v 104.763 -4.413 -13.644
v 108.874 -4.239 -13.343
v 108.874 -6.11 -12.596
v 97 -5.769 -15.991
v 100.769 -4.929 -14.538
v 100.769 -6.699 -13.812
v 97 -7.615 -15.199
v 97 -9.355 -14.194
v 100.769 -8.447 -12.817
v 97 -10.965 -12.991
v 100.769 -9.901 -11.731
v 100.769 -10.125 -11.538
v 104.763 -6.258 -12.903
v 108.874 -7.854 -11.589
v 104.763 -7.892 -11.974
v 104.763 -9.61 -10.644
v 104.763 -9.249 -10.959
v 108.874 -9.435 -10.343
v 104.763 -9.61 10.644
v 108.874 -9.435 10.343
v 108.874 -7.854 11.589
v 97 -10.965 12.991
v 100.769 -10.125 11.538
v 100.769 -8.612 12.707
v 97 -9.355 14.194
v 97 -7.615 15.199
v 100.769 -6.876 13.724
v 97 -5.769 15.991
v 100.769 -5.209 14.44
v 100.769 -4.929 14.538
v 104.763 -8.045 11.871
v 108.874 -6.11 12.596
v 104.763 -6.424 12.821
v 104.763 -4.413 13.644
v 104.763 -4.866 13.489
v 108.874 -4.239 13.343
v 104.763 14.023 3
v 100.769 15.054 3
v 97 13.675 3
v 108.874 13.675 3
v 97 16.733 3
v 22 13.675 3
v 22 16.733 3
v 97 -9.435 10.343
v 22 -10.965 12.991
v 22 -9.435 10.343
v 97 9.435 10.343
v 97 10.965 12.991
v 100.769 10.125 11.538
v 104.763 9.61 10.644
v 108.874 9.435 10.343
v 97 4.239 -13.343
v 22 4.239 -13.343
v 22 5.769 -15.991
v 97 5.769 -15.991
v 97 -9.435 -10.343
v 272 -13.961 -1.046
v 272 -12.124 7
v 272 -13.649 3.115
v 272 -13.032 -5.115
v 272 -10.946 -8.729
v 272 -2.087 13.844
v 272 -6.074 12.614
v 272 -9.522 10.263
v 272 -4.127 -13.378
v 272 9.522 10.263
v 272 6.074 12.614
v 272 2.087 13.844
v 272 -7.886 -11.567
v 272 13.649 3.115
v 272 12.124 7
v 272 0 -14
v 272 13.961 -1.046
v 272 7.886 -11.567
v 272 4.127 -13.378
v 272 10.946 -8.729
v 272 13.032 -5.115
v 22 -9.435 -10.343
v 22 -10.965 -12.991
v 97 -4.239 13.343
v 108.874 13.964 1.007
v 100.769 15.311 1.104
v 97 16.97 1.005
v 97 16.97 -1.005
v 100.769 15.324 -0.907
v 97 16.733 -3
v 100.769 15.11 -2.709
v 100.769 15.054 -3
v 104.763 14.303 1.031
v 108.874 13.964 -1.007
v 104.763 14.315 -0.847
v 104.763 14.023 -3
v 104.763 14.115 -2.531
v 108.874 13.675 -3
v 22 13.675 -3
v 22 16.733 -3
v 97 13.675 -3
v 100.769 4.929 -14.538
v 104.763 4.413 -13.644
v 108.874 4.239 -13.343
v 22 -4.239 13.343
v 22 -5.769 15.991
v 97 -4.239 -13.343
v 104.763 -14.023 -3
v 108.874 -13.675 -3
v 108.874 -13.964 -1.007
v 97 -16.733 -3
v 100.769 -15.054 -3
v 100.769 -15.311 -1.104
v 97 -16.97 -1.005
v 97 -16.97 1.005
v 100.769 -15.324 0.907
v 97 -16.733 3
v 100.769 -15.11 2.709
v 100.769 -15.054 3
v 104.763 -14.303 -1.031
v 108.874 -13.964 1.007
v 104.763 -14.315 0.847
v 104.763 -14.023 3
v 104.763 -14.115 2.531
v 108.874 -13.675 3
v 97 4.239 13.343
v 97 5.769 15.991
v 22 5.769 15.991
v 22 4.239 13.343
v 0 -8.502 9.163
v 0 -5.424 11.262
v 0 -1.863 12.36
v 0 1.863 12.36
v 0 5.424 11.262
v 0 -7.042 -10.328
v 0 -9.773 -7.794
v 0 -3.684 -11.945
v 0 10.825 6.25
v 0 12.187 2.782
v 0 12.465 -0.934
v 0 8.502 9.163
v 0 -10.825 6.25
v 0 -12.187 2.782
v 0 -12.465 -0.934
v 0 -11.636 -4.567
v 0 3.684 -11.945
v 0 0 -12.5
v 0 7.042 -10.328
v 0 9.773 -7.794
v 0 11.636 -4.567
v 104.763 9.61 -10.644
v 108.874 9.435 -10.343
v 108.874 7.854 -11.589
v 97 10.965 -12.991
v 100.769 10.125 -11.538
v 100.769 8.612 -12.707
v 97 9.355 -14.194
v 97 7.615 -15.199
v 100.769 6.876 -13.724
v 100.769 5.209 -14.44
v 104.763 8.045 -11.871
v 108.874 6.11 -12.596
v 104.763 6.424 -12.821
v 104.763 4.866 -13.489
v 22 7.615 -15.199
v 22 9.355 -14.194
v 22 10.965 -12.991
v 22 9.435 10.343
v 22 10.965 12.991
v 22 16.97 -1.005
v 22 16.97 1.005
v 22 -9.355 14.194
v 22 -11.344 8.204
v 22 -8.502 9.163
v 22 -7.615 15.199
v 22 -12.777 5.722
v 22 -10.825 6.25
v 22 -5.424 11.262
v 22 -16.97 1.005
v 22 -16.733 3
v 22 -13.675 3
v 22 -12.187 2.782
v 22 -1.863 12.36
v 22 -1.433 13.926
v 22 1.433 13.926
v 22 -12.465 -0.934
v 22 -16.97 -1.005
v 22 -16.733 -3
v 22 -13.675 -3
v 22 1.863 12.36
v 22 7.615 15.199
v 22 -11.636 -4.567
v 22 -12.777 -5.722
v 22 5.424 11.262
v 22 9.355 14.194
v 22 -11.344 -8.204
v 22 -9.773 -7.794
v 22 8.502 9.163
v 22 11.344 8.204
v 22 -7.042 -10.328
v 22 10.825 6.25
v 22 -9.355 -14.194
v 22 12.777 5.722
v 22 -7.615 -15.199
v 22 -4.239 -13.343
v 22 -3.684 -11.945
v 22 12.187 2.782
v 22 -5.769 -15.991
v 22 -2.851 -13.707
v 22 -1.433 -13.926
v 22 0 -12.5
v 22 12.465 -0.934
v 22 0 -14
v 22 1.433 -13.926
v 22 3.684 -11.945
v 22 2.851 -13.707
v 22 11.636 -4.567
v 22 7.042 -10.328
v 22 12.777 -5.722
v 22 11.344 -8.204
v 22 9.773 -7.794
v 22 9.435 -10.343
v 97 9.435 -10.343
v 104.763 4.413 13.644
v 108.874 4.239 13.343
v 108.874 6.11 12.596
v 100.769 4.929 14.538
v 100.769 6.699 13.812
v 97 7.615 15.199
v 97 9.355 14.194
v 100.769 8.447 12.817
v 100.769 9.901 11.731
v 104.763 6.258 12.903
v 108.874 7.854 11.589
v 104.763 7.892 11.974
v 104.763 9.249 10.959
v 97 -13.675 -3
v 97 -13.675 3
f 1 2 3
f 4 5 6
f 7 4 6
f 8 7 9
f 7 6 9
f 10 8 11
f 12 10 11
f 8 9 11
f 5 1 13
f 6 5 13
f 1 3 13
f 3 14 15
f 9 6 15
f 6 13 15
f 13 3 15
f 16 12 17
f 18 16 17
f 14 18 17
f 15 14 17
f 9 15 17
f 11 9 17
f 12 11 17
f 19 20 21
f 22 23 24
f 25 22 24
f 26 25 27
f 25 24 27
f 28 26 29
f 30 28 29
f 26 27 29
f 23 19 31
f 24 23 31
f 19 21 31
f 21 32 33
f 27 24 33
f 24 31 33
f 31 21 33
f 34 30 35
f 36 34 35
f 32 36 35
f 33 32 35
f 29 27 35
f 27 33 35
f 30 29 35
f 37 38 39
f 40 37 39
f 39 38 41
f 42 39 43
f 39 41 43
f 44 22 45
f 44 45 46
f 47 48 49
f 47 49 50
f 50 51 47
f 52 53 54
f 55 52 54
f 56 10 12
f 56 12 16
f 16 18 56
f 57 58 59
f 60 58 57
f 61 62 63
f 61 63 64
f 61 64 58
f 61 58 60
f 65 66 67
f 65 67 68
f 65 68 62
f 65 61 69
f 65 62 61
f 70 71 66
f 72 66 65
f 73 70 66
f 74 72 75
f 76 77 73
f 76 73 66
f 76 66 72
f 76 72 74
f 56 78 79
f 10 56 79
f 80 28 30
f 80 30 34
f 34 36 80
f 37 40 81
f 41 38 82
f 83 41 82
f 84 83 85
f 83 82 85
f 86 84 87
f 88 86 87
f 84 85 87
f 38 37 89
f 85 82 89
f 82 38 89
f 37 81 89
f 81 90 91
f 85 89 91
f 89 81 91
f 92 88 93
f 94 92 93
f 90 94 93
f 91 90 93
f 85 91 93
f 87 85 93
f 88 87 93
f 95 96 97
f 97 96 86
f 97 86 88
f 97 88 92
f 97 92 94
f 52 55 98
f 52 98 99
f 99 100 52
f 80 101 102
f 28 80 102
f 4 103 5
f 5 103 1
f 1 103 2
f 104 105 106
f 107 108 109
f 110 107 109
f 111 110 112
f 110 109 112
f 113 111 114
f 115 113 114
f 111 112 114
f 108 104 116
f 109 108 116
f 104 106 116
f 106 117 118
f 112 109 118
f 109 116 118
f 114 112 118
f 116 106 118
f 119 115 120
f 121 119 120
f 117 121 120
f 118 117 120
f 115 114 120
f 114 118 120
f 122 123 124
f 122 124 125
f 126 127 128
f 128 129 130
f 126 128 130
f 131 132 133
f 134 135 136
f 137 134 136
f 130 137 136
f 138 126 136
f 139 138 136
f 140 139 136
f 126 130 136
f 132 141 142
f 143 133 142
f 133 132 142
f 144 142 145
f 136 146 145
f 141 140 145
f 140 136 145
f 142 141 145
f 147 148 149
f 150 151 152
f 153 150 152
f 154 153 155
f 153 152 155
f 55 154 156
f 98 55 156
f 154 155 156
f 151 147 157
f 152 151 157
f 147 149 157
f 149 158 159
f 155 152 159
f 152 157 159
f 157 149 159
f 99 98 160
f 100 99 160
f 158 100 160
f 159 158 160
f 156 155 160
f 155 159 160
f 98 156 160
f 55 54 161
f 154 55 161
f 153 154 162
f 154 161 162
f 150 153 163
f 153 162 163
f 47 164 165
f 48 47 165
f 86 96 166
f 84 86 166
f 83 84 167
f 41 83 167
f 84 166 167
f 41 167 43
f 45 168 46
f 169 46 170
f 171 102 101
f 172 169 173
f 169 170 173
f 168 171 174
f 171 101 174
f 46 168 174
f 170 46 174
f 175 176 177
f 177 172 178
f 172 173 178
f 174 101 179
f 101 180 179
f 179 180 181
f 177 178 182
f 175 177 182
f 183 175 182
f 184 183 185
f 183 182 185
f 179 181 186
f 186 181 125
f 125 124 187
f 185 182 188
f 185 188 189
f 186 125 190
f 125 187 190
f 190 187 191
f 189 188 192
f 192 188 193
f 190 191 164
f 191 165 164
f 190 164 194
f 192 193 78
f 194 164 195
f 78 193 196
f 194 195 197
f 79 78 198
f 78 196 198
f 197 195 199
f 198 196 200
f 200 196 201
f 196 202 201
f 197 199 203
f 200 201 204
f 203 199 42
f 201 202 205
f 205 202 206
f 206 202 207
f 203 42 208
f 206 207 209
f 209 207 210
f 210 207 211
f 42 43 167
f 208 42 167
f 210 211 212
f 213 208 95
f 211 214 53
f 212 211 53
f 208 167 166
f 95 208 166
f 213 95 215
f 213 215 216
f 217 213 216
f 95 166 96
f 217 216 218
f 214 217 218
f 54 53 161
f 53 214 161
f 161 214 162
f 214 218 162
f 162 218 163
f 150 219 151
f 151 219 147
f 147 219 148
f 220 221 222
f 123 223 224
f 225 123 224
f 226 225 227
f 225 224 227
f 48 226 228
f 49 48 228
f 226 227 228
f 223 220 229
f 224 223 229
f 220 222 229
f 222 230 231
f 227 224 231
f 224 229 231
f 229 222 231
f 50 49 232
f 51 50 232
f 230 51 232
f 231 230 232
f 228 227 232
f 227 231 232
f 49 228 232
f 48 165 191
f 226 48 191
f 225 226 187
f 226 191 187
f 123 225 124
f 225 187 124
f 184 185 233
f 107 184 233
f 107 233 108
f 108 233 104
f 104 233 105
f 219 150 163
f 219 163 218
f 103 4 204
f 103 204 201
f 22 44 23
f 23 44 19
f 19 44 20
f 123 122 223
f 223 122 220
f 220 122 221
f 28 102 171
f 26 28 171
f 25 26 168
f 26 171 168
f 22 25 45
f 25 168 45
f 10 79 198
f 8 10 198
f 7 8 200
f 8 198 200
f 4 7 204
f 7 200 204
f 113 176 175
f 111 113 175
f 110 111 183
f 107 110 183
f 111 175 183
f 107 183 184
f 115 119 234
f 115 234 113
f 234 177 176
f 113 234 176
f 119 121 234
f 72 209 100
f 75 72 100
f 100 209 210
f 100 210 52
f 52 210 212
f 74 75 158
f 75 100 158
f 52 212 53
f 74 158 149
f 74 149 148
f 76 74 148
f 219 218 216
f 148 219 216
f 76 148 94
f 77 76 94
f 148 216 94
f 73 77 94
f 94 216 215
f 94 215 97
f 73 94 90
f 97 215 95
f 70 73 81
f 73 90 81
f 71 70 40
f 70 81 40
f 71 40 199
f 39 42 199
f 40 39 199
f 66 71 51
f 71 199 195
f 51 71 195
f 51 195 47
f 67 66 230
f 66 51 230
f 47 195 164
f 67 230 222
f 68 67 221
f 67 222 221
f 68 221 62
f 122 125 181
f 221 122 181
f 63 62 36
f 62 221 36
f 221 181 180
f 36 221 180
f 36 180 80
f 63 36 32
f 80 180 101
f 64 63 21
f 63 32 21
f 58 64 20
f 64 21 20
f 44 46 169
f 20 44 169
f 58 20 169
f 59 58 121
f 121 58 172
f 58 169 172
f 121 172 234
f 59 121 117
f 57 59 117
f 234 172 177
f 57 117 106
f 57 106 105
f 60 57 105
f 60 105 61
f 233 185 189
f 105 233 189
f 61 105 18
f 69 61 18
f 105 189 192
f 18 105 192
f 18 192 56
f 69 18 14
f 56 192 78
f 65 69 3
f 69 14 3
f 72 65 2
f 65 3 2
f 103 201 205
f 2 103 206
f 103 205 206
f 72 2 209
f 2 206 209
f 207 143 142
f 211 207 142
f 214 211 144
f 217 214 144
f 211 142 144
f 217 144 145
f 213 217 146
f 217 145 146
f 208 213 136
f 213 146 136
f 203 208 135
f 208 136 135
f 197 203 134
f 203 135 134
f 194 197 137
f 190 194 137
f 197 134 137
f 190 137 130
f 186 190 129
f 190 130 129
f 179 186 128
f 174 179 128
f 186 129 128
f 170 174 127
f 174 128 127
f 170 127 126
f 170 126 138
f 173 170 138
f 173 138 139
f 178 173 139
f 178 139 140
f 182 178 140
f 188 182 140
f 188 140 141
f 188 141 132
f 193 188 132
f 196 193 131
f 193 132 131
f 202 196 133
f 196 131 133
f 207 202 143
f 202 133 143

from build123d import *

# Parameters (mm, degrees)
SKETCH1_R           = 12.5
BOSS_EXTRUDE1_DEPTH = 22
SKETCH3_R           = 14
BOSS_EXTRUDE2_DEPTH = 250
BOSS_EXTRUDE3_DEPTH = 75
FILLET3_R           = 25


with BuildPart() as part:
    # Sketch1 → Boss-Extrude1 (new body)
    with BuildSketch(Plane(origin=(0, 0, 0), x_dir=(0, 0, -1), z_dir=(1, 0, 0))):
        Circle(SKETCH1_R)
    extrude(amount=BOSS_EXTRUDE1_DEPTH)

    # Sketch3 → Boss-Extrude2 (add)
    with BuildSketch(Plane(origin=(22, 0, 0), x_dir=(0, 0, -1), z_dir=(1, 0, 0))):
        Circle(SKETCH3_R)
    extrude(amount=BOSS_EXTRUDE2_DEPTH)

    # Sketch2 → Boss-Extrude3 (add)
    with BuildSketch(Plane(origin=(22, 0, 0), x_dir=(0, 0, -1), z_dir=(1, 0, 0))):
        with BuildLine():
            Line((-13.342719282, -4.239320954), (-15.991376746, -5.768524054))
            ThreePointArc((-15.991376746, -5.768524054), (-14.722431864, -8.5), (-12.991376746, -10.964676477))
            Line((-12.991376746, -10.964676477), (-10.342719282, -9.435473377))
            ThreePointArc((-10.342719282, -9.435473377), (-7, -12.124355653), (-3, -13.674794331))
            Line((-3, -13.674794331), (-3, -16.733200531))
            ThreePointArc((-3, -16.733200531), (0, -17), (3, -16.733200531))
            Line((3, -16.733200531), (3, -13.674794331))
            ThreePointArc((3, -13.674794331), (7, -12.124355653), (10.342719282, -9.435473377))
            Line((10.342719282, -9.435473377), (12.991376746, -10.964676477))
            ThreePointArc((12.991376746, -10.964676477), (14.722431864, -8.5), (15.991376746, -5.768524054))
            Line((15.991376746, -5.768524054), (13.342719282, -4.239320954))
            ThreePointArc((13.342719282, -4.239320954), (14, 0), (13.342719282, 4.239320954))
            Line((13.342719282, 4.239320954), (15.991376746, 5.768524054))
            ThreePointArc((15.991376746, 5.768524054), (14.722431864, 8.5), (12.991376746, 10.964676477))
            Line((12.991376746, 10.964676477), (10.342719282, 9.435473377))
            ThreePointArc((10.342719282, 9.435473377), (7, 12.124355653), (3, 13.674794331))
            Line((3, 13.674794331), (3, 16.733200531))
            ThreePointArc((3, 16.733200531), (0, 17), (-3, 16.733200531))
            Line((-3, 16.733200531), (-3, 13.674794331))
            ThreePointArc((-3, 13.674794331), (-7, 12.124355653), (-10.342719282, 9.435473377))
            Line((-10.342719282, 9.435473377), (-12.991376746, 10.964676477))
            ThreePointArc((-12.991376746, 10.964676477), (-14.722431864, 8.5), (-15.991376746, 5.768524054))
            Line((-15.991376746, 5.768524054), (-13.342719282, 4.239320954))
            ThreePointArc((-13.342719282, 4.239320954), (-14, 0), (-13.342719282, -4.239320954))
        make_face()
    extrude(amount=BOSS_EXTRUDE3_DEPTH)

    # Fillet3
    # the kernel refuses this fillet: 25 mm, written as the material it adds along each edge
    with BuildSketch(Plane(origin=(97, 0, 0), x_dir=(0, 0.27784568580579977, 0.960625720496336), z_dir=(0, -0.960625720496336, 0.27784568580579977))) as fillet3_piece_1_section:
        with BuildLine():
            CenterArc((39, -11.874342087), FILLET3_R, 151.642363424, 28.357636576)
            Line((17, 0), (14, 0))
            Line((14, 0), (14, -11.874342087))
        make_face()
    fillet3_piece_1 = revolve(axis=Axis((97, 0, 0), (-1, 0, 0)), revolution_arc=267.736659013, mode=Mode.PRIVATE)
    fillet3_piece_1 = split(fillet3_piece_1, bisect_by=Plane(origin=(97, 2.598076211, -1.5), z_dir=(0, -0.8660254037844357, 0.5000000000000051)), keep=Keep.TOP, mode=Mode.PRIVATE)
    fillet3_piece_1 = split(fillet3_piece_1, bisect_by=Plane(origin=(97, -2.598076211, 1.5), z_dir=(0, 0.8660254037844359, -0.5000000000000047)), keep=Keep.TOP, mode=Mode.PRIVATE)
    add(fillet3_piece_1)
    with BuildSketch(Plane(origin=(97, 0, 0), x_dir=(0, 0.27784568580579977, 0.960625720496336), z_dir=(0, -0.960625720496336, 0.27784568580579977))) as fillet3_piece_2_section:
        with BuildLine():
            CenterArc((39, -11.874342087), FILLET3_R, 151.642363424, 28.357636576)
            Line((17, 0), (14, 0))
            Line((14, 0), (14, -11.874342087))
        make_face()
    fillet3_piece_2 = revolve(axis=Axis((97, 0, 0), (-1, 0, 0)), revolution_arc=267.736659013, mode=Mode.PRIVATE)
    fillet3_piece_2 = split(fillet3_piece_2, bisect_by=Plane(origin=(97, 0, -3), z_dir=(0, 0, 1)), keep=Keep.TOP, mode=Mode.PRIVATE)
    fillet3_piece_2 = split(fillet3_piece_2, bisect_by=Plane(origin=(97, 0, 3), z_dir=(0, 0, -1)), keep=Keep.TOP, mode=Mode.PRIVATE)
    add(fillet3_piece_2)
    with BuildSketch(Plane(origin=(97, 0, 0), x_dir=(0, 0.27784568580579977, 0.960625720496336), z_dir=(0, -0.960625720496336, 0.27784568580579977))) as fillet3_piece_3_section:
        with BuildLine():
            CenterArc((39, -11.874342087), FILLET3_R, 151.642363424, 28.357636576)
            Line((17, 0), (14, 0))
            Line((14, 0), (14, -11.874342087))
        make_face()
    fillet3_piece_3 = revolve(axis=Axis((97, 0, 0), (-1, 0, 0)), revolution_arc=267.736659013, mode=Mode.PRIVATE)
    fillet3_piece_3 = split(fillet3_piece_3, bisect_by=Plane(origin=(97, -2.598076211, -1.5), z_dir=(0, 0.8660254037844438, 0.4999999999999911)), keep=Keep.TOP, mode=Mode.PRIVATE)
    fillet3_piece_3 = split(fillet3_piece_3, bisect_by=Plane(origin=(97, 2.598076211, 1.5), z_dir=(0, -0.8660254037844435, -0.49999999999999156)), keep=Keep.TOP, mode=Mode.PRIVATE)
    add(fillet3_piece_3)
    with BuildSketch(Plane(origin=(97, 0, 0), x_dir=(0, 0.9708491203814568, 0.23969143800843562), z_dir=(0, -0.23969143800843562, 0.9708491203814568))) as fillet3_piece_4_section:
        with BuildLine():
            CenterArc((39, -11.874342087), FILLET3_R, 151.642363424, 28.357636576)
            Line((17, 0), (14, 0))
            Line((14, 0), (14, -11.874342087))
        make_face()
    fillet3_piece_4 = revolve(axis=Axis((97, 0, 0), (-1, 0, 0)), revolution_arc=267.736659013, mode=Mode.PRIVATE)
    fillet3_piece_4 = split(fillet3_piece_4, bisect_by=Plane(origin=(97, 0, -3), z_dir=(0, 0, 1)), keep=Keep.TOP, mode=Mode.PRIVATE)
    fillet3_piece_4 = split(fillet3_piece_4, bisect_by=Plane(origin=(97, 0, 3), z_dir=(0, 0, -1)), keep=Keep.TOP, mode=Mode.PRIVATE)
    add(fillet3_piece_4)
    with BuildSketch(Plane(origin=(97, 0, 0), x_dir=(0, 0.9708491203814568, 0.23969143800843562), z_dir=(0, -0.23969143800843562, 0.9708491203814568))) as fillet3_piece_5_section:
        with BuildLine():
            CenterArc((39, -11.874342087), FILLET3_R, 151.642363424, 28.357636576)
            Line((17, 0), (14, 0))
            Line((14, 0), (14, -11.874342087))
        make_face()
    fillet3_piece_5 = revolve(axis=Axis((97, 0, 0), (-1, 0, 0)), revolution_arc=267.736659013, mode=Mode.PRIVATE)
    fillet3_piece_5 = split(fillet3_piece_5, bisect_by=Plane(origin=(97, -2.598076211, -1.5), z_dir=(0, 0.8660254037844438, 0.4999999999999911)), keep=Keep.TOP, mode=Mode.PRIVATE)
    fillet3_piece_5 = split(fillet3_piece_5, bisect_by=Plane(origin=(97, 2.598076211, 1.5), z_dir=(0, -0.8660254037844435, -0.49999999999999156)), keep=Keep.TOP, mode=Mode.PRIVATE)
    add(fillet3_piece_5)
    with BuildSketch(Plane(origin=(97, 0, 0), x_dir=(0, 0.9708491203814568, 0.23969143800843562), z_dir=(0, -0.23969143800843562, 0.9708491203814568))) as fillet3_piece_6_section:
        with BuildLine():
            CenterArc((39, -11.874342087), FILLET3_R, 151.642363424, 28.357636576)
            Line((17, 0), (14, 0))
            Line((14, 0), (14, -11.874342087))
        make_face()
    fillet3_piece_6 = revolve(axis=Axis((97, 0, 0), (-1, 0, 0)), revolution_arc=267.736659013, mode=Mode.PRIVATE)
    fillet3_piece_6 = split(fillet3_piece_6, bisect_by=Plane(origin=(97, -2.598076211, 1.5), z_dir=(0, 0.8660254037844325, -0.5000000000000107)), keep=Keep.TOP, mode=Mode.PRIVATE)
    fillet3_piece_6 = split(fillet3_piece_6, bisect_by=Plane(origin=(97, 2.598076211, -1.5), z_dir=(0, -0.8660254037844329, 0.5000000000000101)), keep=Keep.TOP, mode=Mode.PRIVATE)
    add(fillet3_piece_6)
    with BuildSketch(Plane(origin=(97, 0, 0), x_dir=(0, 0.6930034345756666, -0.7209342824878907), z_dir=(0, 0.7209342824878907, 0.6930034345756666))) as fillet3_piece_7_section:
        with BuildLine():
            CenterArc((39, -11.874342087), FILLET3_R, 151.642363424, 28.357636576)
            Line((17, 0), (14, 0))
            Line((14, 0), (14, -11.874342087))
        make_face()
    fillet3_piece_7 = revolve(axis=Axis((97, 0, 0), (-1, 0, 0)), revolution_arc=267.736659013, mode=Mode.PRIVATE)
    fillet3_piece_7 = split(fillet3_piece_7, bisect_by=Plane(origin=(97, -2.598076211, -1.5), z_dir=(0, 0.8660254037844438, 0.4999999999999911)), keep=Keep.TOP, mode=Mode.PRIVATE)
    fillet3_piece_7 = split(fillet3_piece_7, bisect_by=Plane(origin=(97, 2.598076211, 1.5), z_dir=(0, -0.8660254037844435, -0.49999999999999156)), keep=Keep.TOP, mode=Mode.PRIVATE)
    add(fillet3_piece_7)
    with BuildSketch(Plane(origin=(97, 0, 0), x_dir=(0, 0.6930034345756666, -0.7209342824878907), z_dir=(0, 0.7209342824878907, 0.6930034345756666))) as fillet3_piece_8_section:
        with BuildLine():
            CenterArc((39, -11.874342087), FILLET3_R, 151.642363424, 28.357636576)
            Line((17, 0), (14, 0))
            Line((14, 0), (14, -11.874342087))
        make_face()
    fillet3_piece_8 = revolve(axis=Axis((97, 0, 0), (-1, 0, 0)), revolution_arc=267.736659013, mode=Mode.PRIVATE)
    fillet3_piece_8 = split(fillet3_piece_8, bisect_by=Plane(origin=(97, 2.598076211, -1.5), z_dir=(0, -0.8660254037844357, 0.5000000000000051)), keep=Keep.TOP, mode=Mode.PRIVATE)
    fillet3_piece_8 = split(fillet3_piece_8, bisect_by=Plane(origin=(97, -2.598076211, 1.5), z_dir=(0, 0.8660254037844359, -0.5000000000000047)), keep=Keep.TOP, mode=Mode.PRIVATE)
    add(fillet3_piece_8)
    with BuildSketch(Plane(origin=(97, 0, 0), x_dir=(0, 0.6930034345756666, -0.7209342824878907), z_dir=(0, 0.7209342824878907, 0.6930034345756666))) as fillet3_piece_9_section:
        with BuildLine():
            CenterArc((39, -11.874342087), FILLET3_R, 151.642363424, 28.357636576)
            Line((17, 0), (14, 0))
            Line((14, 0), (14, -11.874342087))
        make_face()
    fillet3_piece_9 = revolve(axis=Axis((97, 0, 0), (-1, 0, 0)), revolution_arc=267.736659013, mode=Mode.PRIVATE)
    fillet3_piece_9 = split(fillet3_piece_9, bisect_by=Plane(origin=(97, 0, 3), z_dir=(0, 0, -1)), keep=Keep.TOP, mode=Mode.PRIVATE)
    fillet3_piece_9 = split(fillet3_piece_9, bisect_by=Plane(origin=(97, 0, -3), z_dir=(0, 0, 1)), keep=Keep.TOP, mode=Mode.PRIVATE)
    add(fillet3_piece_9)
    with BuildSketch(Plane(origin=(97, 0, 0), x_dir=(0, -0.2778456858057889, -0.9606257204963392), z_dir=(0, 0.9606257204963392, -0.2778456858057889))) as fillet3_piece_10_section:
        with BuildLine():
            CenterArc((39, -11.874342087), FILLET3_R, 151.642363424, 28.357636576)
            Line((17, 0), (14, 0))
            Line((14, 0), (14, -11.874342087))
        make_face()
    fillet3_piece_10 = revolve(axis=Axis((97, 0, 0), (-1, 0, 0)), revolution_arc=267.736659013, mode=Mode.PRIVATE)
    fillet3_piece_10 = split(fillet3_piece_10, bisect_by=Plane(origin=(97, 2.598076211, -1.5), z_dir=(0, -0.8660254037844357, 0.5000000000000051)), keep=Keep.TOP, mode=Mode.PRIVATE)
    fillet3_piece_10 = split(fillet3_piece_10, bisect_by=Plane(origin=(97, -2.598076211, 1.5), z_dir=(0, 0.8660254037844359, -0.5000000000000047)), keep=Keep.TOP, mode=Mode.PRIVATE)
    add(fillet3_piece_10)
    with BuildSketch(Plane(origin=(97, 0, 0), x_dir=(0, -0.2778456858057889, -0.9606257204963392), z_dir=(0, 0.9606257204963392, -0.2778456858057889))) as fillet3_piece_11_section:
        with BuildLine():
            CenterArc((39, -11.874342087), FILLET3_R, 151.642363424, 28.357636576)
            Line((17, 0), (14, 0))
            Line((14, 0), (14, -11.874342087))
        make_face()
    fillet3_piece_11 = revolve(axis=Axis((97, 0, 0), (-1, 0, 0)), revolution_arc=267.736659013, mode=Mode.PRIVATE)
    fillet3_piece_11 = split(fillet3_piece_11, bisect_by=Plane(origin=(97, 0, -3), z_dir=(0, 0, 1)), keep=Keep.TOP, mode=Mode.PRIVATE)
    fillet3_piece_11 = split(fillet3_piece_11, bisect_by=Plane(origin=(97, 0, 3), z_dir=(0, 0, -1)), keep=Keep.TOP, mode=Mode.PRIVATE)
    add(fillet3_piece_11)
    with BuildSketch(Plane(origin=(97, 0, 0), x_dir=(0, -0.2778456858057889, -0.9606257204963392), z_dir=(0, 0.9606257204963392, -0.2778456858057889))) as fillet3_piece_12_section:
        with BuildLine():
            CenterArc((39, -11.874342087), FILLET3_R, 151.642363424, 28.357636576)
            Line((17, 0), (14, 0))
            Line((14, 0), (14, -11.874342087))
        make_face()
    fillet3_piece_12 = revolve(axis=Axis((97, 0, 0), (-1, 0, 0)), revolution_arc=267.736659013, mode=Mode.PRIVATE)
    fillet3_piece_12 = split(fillet3_piece_12, bisect_by=Plane(origin=(97, 2.598076211, 1.5), z_dir=(0, -0.86602540378444, -0.4999999999999976)), keep=Keep.TOP, mode=Mode.PRIVATE)
    fillet3_piece_12 = split(fillet3_piece_12, bisect_by=Plane(origin=(97, -2.598076211, -1.5), z_dir=(0, 0.86602540378444, 0.49999999999999767)), keep=Keep.TOP, mode=Mode.PRIVATE)
    add(fillet3_piece_12)
    with BuildSketch(Plane(origin=(97, 0, 0), x_dir=(0, -0.9708491203814544, -0.23969143800844478), z_dir=(0, 0.23969143800844478, -0.9708491203814544))) as fillet3_piece_13_section:
        with BuildLine():
            CenterArc((39, -11.874342087), FILLET3_R, 151.642363424, 28.357636576)
            Line((17, 0), (14, 0))
            Line((14, 0), (14, -11.874342087))
        make_face()
    fillet3_piece_13 = revolve(axis=Axis((97, 0, 0), (-1, 0, 0)), revolution_arc=267.736659013, mode=Mode.PRIVATE)
    fillet3_piece_13 = split(fillet3_piece_13, bisect_by=Plane(origin=(97, 0, -3), z_dir=(0, 0, 1)), keep=Keep.TOP, mode=Mode.PRIVATE)
    fillet3_piece_13 = split(fillet3_piece_13, bisect_by=Plane(origin=(97, 0, 3), z_dir=(0, 0, -1)), keep=Keep.TOP, mode=Mode.PRIVATE)
    add(fillet3_piece_13)
    with BuildSketch(Plane(origin=(97, 0, 0), x_dir=(0, -0.9708491203814544, -0.23969143800844478), z_dir=(0, 0.23969143800844478, -0.9708491203814544))) as fillet3_piece_14_section:
        with BuildLine():
            CenterArc((39, -11.874342087), FILLET3_R, 151.642363424, 28.357636576)
            Line((17, 0), (14, 0))
            Line((14, 0), (14, -11.874342087))
        make_face()
    fillet3_piece_14 = revolve(axis=Axis((97, 0, 0), (-1, 0, 0)), revolution_arc=267.736659013, mode=Mode.PRIVATE)
    fillet3_piece_14 = split(fillet3_piece_14, bisect_by=Plane(origin=(97, -2.598076211, -1.5), z_dir=(0, 0.8660254037844438, 0.4999999999999911)), keep=Keep.TOP, mode=Mode.PRIVATE)
    fillet3_piece_14 = split(fillet3_piece_14, bisect_by=Plane(origin=(97, 2.598076211, 1.5), z_dir=(0, -0.8660254037844435, -0.49999999999999156)), keep=Keep.TOP, mode=Mode.PRIVATE)
    add(fillet3_piece_14)
    with BuildSketch(Plane(origin=(97, 0, 0), x_dir=(0, -0.9708491203814544, -0.23969143800844478), z_dir=(0, 0.23969143800844478, -0.9708491203814544))) as fillet3_piece_15_section:
        with BuildLine():
            CenterArc((39, -11.874342087), FILLET3_R, 151.642363424, 28.357636576)
            Line((17, 0), (14, 0))
            Line((14, 0), (14, -11.874342087))
        make_face()
    fillet3_piece_15 = revolve(axis=Axis((97, 0, 0), (-1, 0, 0)), revolution_arc=267.736659013, mode=Mode.PRIVATE)
    fillet3_piece_15 = split(fillet3_piece_15, bisect_by=Plane(origin=(97, 2.598076211, -1.5), z_dir=(0, -0.8660254037844357, 0.5000000000000051)), keep=Keep.TOP, mode=Mode.PRIVATE)
    fillet3_piece_15 = split(fillet3_piece_15, bisect_by=Plane(origin=(97, -2.598076211, 1.5), z_dir=(0, 0.8660254037844359, -0.5000000000000047)), keep=Keep.TOP, mode=Mode.PRIVATE)
    add(fillet3_piece_15)
    with BuildSketch(Plane(origin=(97, 0, 0), x_dir=(0, -0.6930034345756619, 0.7209342824878952), z_dir=(0, -0.7209342824878952, -0.6930034345756619))) as fillet3_piece_16_section:
        with BuildLine():
            CenterArc((39, -11.874342087), FILLET3_R, 151.642363424, 28.357636576)
            Line((17, 0), (14, 0))
            Line((14, 0), (14, -11.874342087))
        make_face()
    fillet3_piece_16 = revolve(axis=Axis((97, 0, 0), (-1, 0, 0)), revolution_arc=267.736659013, mode=Mode.PRIVATE)
    fillet3_piece_16 = split(fillet3_piece_16, bisect_by=Plane(origin=(97, -2.598076211, -1.5), z_dir=(0, 0.8660254037844438, 0.4999999999999911)), keep=Keep.TOP, mode=Mode.PRIVATE)
    fillet3_piece_16 = split(fillet3_piece_16, bisect_by=Plane(origin=(97, 2.598076211, 1.5), z_dir=(0, -0.8660254037844435, -0.49999999999999156)), keep=Keep.TOP, mode=Mode.PRIVATE)
    add(fillet3_piece_16)
    with BuildSketch(Plane(origin=(97, 0, 0), x_dir=(0, -0.6930034345756619, 0.7209342824878952), z_dir=(0, -0.7209342824878952, -0.6930034345756619))) as fillet3_piece_17_section:
        with BuildLine():
            CenterArc((39, -11.874342087), FILLET3_R, 151.642363424, 28.357636576)
            Line((17, 0), (14, 0))
            Line((14, 0), (14, -11.874342087))
        make_face()
    fillet3_piece_17 = revolve(axis=Axis((97, 0, 0), (-1, 0, 0)), revolution_arc=267.736659013, mode=Mode.PRIVATE)
    fillet3_piece_17 = split(fillet3_piece_17, bisect_by=Plane(origin=(97, 2.598076211, -1.5), z_dir=(0, -0.8660254037844357, 0.5000000000000051)), keep=Keep.TOP, mode=Mode.PRIVATE)
    fillet3_piece_17 = split(fillet3_piece_17, bisect_by=Plane(origin=(97, -2.598076211, 1.5), z_dir=(0, 0.8660254037844359, -0.5000000000000047)), keep=Keep.TOP, mode=Mode.PRIVATE)
    add(fillet3_piece_17)
    with BuildSketch(Plane(origin=(97, 0, 0), x_dir=(0, -0.6930034345756619, 0.7209342824878952), z_dir=(0, -0.7209342824878952, -0.6930034345756619))) as fillet3_piece_18_section:
        with BuildLine():
            CenterArc((39, -11.874342087), FILLET3_R, 151.642363424, 28.357636576)
            Line((17, 0), (14, 0))
            Line((14, 0), (14, -11.874342087))
        make_face()
    fillet3_piece_18 = revolve(axis=Axis((97, 0, 0), (-1, 0, 0)), revolution_arc=267.736659013, mode=Mode.PRIVATE)
    fillet3_piece_18 = split(fillet3_piece_18, bisect_by=Plane(origin=(97, 0, -3), z_dir=(0, 0, 1)), keep=Keep.TOP, mode=Mode.PRIVATE)
    fillet3_piece_18 = split(fillet3_piece_18, bisect_by=Plane(origin=(97, 0, 3), z_dir=(0, 0, -1)), keep=Keep.TOP, mode=Mode.PRIVATE)
    add(fillet3_piece_18)


solid = part.part
